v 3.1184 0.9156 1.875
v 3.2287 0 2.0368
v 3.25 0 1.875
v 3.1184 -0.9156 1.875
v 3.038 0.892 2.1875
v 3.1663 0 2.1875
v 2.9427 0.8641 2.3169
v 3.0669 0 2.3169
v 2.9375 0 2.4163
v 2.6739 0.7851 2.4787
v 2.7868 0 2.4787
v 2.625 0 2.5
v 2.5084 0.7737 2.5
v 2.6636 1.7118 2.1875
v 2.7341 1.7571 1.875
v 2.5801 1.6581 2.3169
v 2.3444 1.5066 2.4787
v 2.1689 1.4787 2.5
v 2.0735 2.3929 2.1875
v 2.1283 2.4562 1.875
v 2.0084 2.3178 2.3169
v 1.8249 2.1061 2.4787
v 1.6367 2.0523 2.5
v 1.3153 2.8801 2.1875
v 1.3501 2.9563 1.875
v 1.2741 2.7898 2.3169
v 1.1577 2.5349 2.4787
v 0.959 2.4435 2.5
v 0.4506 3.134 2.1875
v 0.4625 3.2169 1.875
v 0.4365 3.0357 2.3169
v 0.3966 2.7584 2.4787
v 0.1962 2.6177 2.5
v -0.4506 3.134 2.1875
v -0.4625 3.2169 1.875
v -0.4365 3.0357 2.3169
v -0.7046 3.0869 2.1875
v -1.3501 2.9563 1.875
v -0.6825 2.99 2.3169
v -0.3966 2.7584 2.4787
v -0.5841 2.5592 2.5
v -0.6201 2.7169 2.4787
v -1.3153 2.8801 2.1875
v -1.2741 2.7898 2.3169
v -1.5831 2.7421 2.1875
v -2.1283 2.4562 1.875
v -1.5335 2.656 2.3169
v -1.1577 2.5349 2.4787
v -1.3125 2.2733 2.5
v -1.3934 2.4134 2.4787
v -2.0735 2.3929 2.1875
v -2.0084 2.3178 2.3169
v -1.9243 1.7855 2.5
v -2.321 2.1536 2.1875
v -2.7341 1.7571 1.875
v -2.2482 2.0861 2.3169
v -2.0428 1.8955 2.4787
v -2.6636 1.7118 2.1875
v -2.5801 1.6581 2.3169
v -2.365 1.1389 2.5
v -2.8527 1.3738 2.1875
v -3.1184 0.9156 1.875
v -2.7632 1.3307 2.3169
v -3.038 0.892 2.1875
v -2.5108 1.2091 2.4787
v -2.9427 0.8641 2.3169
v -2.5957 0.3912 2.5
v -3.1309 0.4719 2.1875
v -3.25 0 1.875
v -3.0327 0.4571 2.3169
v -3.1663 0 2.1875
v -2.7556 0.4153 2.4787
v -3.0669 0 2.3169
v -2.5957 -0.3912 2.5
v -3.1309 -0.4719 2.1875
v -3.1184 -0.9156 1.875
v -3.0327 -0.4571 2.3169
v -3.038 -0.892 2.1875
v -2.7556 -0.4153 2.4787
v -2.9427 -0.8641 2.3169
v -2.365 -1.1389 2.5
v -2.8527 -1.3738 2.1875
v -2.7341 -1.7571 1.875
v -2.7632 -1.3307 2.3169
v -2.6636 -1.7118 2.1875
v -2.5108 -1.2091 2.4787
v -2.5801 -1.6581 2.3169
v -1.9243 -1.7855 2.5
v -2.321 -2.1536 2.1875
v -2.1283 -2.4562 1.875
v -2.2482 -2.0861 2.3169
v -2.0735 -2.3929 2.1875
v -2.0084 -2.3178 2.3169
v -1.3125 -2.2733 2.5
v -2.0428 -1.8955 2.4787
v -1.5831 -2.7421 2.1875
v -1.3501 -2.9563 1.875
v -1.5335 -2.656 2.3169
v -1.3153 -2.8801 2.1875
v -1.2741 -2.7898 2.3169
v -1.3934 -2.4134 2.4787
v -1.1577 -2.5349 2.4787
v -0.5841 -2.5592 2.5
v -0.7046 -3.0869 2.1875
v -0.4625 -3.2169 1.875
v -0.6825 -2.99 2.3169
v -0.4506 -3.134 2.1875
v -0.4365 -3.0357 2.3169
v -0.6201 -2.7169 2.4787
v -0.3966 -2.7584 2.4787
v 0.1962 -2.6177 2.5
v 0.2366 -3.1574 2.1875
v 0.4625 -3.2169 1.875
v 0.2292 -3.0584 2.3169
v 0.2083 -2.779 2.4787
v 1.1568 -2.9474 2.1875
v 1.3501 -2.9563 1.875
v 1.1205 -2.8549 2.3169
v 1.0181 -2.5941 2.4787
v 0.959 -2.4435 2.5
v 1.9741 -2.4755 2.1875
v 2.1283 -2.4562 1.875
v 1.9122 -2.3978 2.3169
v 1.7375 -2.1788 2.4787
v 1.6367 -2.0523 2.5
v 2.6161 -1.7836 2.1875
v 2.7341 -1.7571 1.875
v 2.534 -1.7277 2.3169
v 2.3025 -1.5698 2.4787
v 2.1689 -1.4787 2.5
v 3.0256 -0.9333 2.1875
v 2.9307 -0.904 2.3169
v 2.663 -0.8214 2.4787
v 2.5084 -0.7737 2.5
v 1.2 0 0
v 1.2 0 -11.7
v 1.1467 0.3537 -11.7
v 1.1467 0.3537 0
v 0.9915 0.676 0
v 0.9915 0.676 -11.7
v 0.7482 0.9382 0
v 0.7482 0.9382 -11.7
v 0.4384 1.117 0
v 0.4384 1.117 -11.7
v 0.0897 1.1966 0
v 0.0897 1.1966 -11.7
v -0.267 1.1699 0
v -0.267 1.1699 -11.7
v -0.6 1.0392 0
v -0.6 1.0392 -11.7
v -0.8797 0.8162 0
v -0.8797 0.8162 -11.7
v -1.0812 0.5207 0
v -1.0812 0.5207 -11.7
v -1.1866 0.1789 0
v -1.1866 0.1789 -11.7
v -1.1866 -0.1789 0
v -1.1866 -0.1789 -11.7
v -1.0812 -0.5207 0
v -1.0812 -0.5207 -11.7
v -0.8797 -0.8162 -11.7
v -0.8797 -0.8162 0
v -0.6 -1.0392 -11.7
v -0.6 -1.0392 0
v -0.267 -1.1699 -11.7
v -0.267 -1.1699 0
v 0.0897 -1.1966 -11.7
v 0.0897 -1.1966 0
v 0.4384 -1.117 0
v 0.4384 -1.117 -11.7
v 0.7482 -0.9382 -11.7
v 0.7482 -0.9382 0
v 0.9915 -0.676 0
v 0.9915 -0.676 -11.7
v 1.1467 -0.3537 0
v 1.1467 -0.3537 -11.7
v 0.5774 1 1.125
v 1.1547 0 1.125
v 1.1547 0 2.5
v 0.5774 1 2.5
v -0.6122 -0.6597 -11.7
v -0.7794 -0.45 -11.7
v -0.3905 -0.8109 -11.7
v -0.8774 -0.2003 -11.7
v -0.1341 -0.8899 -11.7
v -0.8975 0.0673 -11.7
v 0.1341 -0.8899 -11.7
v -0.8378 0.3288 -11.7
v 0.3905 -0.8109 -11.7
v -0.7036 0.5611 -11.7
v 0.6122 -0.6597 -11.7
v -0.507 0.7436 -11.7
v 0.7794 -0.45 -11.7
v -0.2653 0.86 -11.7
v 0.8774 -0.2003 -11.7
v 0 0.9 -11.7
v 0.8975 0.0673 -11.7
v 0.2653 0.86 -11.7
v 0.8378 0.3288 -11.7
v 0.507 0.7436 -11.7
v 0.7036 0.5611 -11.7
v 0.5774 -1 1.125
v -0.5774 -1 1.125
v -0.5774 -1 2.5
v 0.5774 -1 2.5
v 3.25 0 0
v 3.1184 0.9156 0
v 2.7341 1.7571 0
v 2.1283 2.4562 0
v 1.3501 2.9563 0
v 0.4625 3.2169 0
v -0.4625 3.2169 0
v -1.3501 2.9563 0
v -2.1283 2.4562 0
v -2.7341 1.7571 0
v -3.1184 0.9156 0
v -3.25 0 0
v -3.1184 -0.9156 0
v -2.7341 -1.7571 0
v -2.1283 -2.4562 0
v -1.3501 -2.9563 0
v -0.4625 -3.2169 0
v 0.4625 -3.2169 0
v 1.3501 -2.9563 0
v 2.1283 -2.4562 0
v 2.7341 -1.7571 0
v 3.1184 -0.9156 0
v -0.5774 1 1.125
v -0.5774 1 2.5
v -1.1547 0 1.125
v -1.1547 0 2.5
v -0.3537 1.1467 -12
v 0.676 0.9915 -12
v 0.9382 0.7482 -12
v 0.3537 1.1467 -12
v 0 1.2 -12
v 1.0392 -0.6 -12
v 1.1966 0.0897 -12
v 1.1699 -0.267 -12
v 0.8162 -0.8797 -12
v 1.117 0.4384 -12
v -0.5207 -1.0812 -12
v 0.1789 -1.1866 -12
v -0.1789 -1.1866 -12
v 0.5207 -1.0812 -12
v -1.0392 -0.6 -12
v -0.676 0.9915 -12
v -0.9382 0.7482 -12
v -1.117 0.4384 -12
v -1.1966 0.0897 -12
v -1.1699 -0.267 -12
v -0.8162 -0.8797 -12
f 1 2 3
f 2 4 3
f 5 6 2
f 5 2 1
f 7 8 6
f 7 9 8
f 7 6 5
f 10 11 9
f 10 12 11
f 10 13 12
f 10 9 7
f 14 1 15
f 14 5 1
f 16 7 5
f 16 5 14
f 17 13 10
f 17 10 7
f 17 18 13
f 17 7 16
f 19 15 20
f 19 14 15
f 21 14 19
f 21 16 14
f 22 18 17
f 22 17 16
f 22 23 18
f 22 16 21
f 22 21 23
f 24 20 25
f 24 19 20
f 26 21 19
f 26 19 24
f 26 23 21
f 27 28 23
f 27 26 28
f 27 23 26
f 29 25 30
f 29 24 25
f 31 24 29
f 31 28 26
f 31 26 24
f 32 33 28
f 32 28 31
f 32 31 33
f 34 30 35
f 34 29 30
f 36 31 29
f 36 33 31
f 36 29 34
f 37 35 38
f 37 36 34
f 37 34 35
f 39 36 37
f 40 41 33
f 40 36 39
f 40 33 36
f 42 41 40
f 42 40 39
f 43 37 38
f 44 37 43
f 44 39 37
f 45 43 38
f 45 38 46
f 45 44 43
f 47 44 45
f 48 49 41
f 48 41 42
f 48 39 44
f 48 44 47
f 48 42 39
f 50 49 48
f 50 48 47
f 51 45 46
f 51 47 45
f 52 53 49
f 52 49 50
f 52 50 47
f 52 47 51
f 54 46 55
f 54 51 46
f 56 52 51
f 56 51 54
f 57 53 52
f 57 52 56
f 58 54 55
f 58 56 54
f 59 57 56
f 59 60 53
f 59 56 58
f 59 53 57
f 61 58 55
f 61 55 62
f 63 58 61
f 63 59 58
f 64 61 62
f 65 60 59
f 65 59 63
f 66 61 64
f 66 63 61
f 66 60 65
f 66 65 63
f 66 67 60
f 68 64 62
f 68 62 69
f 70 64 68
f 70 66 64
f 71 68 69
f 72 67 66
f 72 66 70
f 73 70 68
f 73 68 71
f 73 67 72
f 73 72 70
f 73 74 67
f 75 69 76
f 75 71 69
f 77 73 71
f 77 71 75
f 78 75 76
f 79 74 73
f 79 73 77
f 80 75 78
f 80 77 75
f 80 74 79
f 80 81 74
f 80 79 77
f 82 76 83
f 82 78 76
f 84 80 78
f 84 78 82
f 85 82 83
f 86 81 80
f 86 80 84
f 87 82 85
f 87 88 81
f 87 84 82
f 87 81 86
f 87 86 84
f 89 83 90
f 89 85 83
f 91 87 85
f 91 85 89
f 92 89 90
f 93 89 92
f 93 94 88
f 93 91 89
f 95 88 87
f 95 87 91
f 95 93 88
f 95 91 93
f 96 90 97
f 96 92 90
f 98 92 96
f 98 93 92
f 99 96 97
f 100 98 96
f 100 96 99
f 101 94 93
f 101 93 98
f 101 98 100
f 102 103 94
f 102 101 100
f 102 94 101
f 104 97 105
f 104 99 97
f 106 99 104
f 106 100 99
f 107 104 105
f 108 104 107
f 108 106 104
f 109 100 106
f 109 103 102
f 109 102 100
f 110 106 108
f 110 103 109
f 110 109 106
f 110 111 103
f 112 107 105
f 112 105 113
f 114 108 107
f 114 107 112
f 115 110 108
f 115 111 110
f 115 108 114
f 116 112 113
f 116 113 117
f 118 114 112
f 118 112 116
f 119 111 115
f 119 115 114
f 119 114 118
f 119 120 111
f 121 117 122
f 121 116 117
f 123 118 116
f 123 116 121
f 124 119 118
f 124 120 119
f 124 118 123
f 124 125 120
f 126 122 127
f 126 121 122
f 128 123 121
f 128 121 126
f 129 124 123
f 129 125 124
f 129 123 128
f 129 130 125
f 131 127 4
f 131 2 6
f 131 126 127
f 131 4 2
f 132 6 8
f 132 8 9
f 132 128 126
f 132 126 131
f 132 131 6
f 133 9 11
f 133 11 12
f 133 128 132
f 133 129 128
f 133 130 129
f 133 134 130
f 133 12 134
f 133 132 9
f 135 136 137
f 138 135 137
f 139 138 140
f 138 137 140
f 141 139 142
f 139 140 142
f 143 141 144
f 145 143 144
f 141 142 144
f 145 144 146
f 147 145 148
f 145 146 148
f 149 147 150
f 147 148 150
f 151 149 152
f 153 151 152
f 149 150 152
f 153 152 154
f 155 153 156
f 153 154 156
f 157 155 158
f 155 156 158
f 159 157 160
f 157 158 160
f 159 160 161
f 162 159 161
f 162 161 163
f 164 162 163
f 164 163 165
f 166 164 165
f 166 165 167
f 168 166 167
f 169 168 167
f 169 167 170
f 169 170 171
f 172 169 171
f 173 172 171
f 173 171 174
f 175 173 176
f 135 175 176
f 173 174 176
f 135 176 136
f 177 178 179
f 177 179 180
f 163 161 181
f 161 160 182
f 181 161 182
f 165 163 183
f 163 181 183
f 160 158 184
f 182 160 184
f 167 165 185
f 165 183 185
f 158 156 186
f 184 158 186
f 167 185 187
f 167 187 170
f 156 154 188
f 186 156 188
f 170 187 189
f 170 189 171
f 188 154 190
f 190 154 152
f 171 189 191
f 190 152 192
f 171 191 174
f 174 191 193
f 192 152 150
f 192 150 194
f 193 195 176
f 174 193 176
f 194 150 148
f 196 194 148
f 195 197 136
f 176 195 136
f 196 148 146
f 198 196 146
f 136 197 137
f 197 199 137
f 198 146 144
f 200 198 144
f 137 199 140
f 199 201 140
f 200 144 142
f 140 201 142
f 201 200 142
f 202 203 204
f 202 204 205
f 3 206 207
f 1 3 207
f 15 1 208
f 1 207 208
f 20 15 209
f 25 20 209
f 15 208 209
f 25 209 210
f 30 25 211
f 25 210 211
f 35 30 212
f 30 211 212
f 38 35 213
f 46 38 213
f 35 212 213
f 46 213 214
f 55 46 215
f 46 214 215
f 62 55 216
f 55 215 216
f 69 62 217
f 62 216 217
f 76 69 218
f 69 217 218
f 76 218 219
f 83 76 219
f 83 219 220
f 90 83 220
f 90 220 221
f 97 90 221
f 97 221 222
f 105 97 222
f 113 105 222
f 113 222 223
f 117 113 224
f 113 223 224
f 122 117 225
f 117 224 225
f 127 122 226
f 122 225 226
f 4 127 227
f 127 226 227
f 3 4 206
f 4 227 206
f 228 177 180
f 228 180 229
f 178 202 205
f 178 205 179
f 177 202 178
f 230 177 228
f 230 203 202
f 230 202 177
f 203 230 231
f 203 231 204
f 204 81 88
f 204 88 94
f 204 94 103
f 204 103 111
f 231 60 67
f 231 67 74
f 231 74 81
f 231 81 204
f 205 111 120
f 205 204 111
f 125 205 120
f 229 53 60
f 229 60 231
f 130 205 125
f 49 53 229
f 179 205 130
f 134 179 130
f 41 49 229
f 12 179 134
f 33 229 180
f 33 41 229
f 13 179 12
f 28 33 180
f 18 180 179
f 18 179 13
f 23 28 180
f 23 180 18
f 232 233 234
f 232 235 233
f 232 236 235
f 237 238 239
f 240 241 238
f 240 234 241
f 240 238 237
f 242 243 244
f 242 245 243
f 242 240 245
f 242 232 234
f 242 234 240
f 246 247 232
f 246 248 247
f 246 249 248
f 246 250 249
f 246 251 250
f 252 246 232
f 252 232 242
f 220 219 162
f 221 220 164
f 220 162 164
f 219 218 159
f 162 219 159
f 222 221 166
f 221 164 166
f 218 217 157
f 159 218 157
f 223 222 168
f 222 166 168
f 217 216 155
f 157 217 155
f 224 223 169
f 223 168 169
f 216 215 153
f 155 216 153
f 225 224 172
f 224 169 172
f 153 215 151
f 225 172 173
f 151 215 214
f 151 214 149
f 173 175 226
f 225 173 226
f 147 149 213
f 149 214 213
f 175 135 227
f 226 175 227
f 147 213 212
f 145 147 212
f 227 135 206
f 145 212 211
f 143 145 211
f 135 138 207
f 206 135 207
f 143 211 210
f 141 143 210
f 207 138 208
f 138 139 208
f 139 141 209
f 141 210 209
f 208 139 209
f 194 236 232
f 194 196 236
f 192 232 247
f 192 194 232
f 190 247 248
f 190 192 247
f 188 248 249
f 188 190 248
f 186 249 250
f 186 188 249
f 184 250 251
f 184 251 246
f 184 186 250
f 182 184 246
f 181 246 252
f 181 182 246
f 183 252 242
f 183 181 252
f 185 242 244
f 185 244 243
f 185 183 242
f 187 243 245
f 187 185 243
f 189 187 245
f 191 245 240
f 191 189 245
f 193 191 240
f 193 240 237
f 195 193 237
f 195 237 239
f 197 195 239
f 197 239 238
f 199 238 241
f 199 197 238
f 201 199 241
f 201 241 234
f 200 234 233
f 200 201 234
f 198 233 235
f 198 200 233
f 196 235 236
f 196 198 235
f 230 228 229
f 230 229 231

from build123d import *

# Parameters (mm, degrees)
F_0030_CYLINDER_SKETCH_R    = 3.25
F_0030_CYLINDER_DEPTH       = 2.5
F_0031_FILLET_R             = 0.625
F_0032_EXTRUDE_DEPTH        = 1.385
F_0032_EXTRUDE_ROTATE_ANGLE = 120
F_0035_CYLINDER_SKETCH_R    = 1.2
F_0035_CYLINDER_DEPTH       = 11.7
F_0036_CONE_ROTATE_ANGLE    = 90


with BuildPart() as part:
    # 0030_cylinder_Sketch → 0030_cylinder (new body)
    with BuildSketch(Plane.XY):
        Circle(F_0030_CYLINDER_SKETCH_R)
    extrude(amount=F_0030_CYLINDER_DEPTH)

    # 0031_fillet
    f_0031_fillet_edges = [part.edges().sort_by_distance(p)[0] for p in [
        (-3.25, 0, 2.5),
    ]]
    fillet(f_0031_fillet_edges, radius=F_0031_FILLET_R)


with BuildPart() as body_2:
    # 0032_extrude_Sketch → 0032_extrude (new body)
    with BuildSketch(Plane.XY):
        Polygon((0, 0), (1.154700538, 0), (1.732050808, 1), (1.154700538, 2), (0, 2), (-0.577350269, 1), align=None)
    extrude(amount=F_0032_EXTRUDE_DEPTH)


with BuildPart() as body_2_1:
    # 0032_extrude_Rotate: read off the stored shape, not the designer's step
    # 0032_extrude_Rotate: moved
    add(body_2.part.rotate(Axis((0, 0, 0), (0, 0, 1)), F_0032_EXTRUDE_ROTATE_ANGLE))


with BuildPart() as body_2_2:
    # 0032_extrude_Translate: moved
    add(body_2_1.part.moved(Location((1.154700538, 0, 1.125))))


with BuildPart() as part_1:
    add(part.part)

    # 0034_sub: cut body 2
    add(body_2_2.part, mode=Mode.SUBTRACT)


with BuildPart() as body_2_2_1:
    # 0035_cylinder_Sketch → 0035_cylinder (new body)
    with BuildSketch(Plane.XY):
        Circle(F_0035_CYLINDER_SKETCH_R)
    extrude(amount=F_0035_CYLINDER_DEPTH)


with BuildPart() as body_2_2_2:
    # 0035_cylinder_Translate: moved
    add(body_2_2_1.part.moved(Location((0, 0, -11.7))))


with BuildPart() as body_3:
    # 0036_cone_Sketch → 0036_cone (revolve)
    with BuildSketch(Plane.XY, mode=Mode.PRIVATE) as f_0036_cone_sk:
        Polygon((0, 0), (1.2, 0), (0.9, 0.3), (0, 0.3), align=None)
    revolve(f_0036_cone_sk.sketch.rotate(Axis((0, -100, 0), (0, 1, 0)), 90), axis=Axis((0, -100, 0), (0, 1, 0)))


with BuildPart() as body_3_1:
    # 0036_cone_Rotate: moved
    add(body_3.part.rotate(Axis((0, 0, 0), (1, 0, 0)), F_0036_CONE_ROTATE_ANGLE))


with BuildPart() as body_3_2:
    # 0036_cone_Translate: moved
    add(body_3_1.part.moved(Location((0, 0, -12))))


with BuildPart() as body_2_2_3:
    add(body_2_2_2.part)

    # 0038_add: union body 3
    add(body_3_2.part)


with BuildPart() as part_2:
    add(part_1.part)

    # 0039_add: union body 2 2
    add(body_2_2_3.part)


solid = part_2.part
